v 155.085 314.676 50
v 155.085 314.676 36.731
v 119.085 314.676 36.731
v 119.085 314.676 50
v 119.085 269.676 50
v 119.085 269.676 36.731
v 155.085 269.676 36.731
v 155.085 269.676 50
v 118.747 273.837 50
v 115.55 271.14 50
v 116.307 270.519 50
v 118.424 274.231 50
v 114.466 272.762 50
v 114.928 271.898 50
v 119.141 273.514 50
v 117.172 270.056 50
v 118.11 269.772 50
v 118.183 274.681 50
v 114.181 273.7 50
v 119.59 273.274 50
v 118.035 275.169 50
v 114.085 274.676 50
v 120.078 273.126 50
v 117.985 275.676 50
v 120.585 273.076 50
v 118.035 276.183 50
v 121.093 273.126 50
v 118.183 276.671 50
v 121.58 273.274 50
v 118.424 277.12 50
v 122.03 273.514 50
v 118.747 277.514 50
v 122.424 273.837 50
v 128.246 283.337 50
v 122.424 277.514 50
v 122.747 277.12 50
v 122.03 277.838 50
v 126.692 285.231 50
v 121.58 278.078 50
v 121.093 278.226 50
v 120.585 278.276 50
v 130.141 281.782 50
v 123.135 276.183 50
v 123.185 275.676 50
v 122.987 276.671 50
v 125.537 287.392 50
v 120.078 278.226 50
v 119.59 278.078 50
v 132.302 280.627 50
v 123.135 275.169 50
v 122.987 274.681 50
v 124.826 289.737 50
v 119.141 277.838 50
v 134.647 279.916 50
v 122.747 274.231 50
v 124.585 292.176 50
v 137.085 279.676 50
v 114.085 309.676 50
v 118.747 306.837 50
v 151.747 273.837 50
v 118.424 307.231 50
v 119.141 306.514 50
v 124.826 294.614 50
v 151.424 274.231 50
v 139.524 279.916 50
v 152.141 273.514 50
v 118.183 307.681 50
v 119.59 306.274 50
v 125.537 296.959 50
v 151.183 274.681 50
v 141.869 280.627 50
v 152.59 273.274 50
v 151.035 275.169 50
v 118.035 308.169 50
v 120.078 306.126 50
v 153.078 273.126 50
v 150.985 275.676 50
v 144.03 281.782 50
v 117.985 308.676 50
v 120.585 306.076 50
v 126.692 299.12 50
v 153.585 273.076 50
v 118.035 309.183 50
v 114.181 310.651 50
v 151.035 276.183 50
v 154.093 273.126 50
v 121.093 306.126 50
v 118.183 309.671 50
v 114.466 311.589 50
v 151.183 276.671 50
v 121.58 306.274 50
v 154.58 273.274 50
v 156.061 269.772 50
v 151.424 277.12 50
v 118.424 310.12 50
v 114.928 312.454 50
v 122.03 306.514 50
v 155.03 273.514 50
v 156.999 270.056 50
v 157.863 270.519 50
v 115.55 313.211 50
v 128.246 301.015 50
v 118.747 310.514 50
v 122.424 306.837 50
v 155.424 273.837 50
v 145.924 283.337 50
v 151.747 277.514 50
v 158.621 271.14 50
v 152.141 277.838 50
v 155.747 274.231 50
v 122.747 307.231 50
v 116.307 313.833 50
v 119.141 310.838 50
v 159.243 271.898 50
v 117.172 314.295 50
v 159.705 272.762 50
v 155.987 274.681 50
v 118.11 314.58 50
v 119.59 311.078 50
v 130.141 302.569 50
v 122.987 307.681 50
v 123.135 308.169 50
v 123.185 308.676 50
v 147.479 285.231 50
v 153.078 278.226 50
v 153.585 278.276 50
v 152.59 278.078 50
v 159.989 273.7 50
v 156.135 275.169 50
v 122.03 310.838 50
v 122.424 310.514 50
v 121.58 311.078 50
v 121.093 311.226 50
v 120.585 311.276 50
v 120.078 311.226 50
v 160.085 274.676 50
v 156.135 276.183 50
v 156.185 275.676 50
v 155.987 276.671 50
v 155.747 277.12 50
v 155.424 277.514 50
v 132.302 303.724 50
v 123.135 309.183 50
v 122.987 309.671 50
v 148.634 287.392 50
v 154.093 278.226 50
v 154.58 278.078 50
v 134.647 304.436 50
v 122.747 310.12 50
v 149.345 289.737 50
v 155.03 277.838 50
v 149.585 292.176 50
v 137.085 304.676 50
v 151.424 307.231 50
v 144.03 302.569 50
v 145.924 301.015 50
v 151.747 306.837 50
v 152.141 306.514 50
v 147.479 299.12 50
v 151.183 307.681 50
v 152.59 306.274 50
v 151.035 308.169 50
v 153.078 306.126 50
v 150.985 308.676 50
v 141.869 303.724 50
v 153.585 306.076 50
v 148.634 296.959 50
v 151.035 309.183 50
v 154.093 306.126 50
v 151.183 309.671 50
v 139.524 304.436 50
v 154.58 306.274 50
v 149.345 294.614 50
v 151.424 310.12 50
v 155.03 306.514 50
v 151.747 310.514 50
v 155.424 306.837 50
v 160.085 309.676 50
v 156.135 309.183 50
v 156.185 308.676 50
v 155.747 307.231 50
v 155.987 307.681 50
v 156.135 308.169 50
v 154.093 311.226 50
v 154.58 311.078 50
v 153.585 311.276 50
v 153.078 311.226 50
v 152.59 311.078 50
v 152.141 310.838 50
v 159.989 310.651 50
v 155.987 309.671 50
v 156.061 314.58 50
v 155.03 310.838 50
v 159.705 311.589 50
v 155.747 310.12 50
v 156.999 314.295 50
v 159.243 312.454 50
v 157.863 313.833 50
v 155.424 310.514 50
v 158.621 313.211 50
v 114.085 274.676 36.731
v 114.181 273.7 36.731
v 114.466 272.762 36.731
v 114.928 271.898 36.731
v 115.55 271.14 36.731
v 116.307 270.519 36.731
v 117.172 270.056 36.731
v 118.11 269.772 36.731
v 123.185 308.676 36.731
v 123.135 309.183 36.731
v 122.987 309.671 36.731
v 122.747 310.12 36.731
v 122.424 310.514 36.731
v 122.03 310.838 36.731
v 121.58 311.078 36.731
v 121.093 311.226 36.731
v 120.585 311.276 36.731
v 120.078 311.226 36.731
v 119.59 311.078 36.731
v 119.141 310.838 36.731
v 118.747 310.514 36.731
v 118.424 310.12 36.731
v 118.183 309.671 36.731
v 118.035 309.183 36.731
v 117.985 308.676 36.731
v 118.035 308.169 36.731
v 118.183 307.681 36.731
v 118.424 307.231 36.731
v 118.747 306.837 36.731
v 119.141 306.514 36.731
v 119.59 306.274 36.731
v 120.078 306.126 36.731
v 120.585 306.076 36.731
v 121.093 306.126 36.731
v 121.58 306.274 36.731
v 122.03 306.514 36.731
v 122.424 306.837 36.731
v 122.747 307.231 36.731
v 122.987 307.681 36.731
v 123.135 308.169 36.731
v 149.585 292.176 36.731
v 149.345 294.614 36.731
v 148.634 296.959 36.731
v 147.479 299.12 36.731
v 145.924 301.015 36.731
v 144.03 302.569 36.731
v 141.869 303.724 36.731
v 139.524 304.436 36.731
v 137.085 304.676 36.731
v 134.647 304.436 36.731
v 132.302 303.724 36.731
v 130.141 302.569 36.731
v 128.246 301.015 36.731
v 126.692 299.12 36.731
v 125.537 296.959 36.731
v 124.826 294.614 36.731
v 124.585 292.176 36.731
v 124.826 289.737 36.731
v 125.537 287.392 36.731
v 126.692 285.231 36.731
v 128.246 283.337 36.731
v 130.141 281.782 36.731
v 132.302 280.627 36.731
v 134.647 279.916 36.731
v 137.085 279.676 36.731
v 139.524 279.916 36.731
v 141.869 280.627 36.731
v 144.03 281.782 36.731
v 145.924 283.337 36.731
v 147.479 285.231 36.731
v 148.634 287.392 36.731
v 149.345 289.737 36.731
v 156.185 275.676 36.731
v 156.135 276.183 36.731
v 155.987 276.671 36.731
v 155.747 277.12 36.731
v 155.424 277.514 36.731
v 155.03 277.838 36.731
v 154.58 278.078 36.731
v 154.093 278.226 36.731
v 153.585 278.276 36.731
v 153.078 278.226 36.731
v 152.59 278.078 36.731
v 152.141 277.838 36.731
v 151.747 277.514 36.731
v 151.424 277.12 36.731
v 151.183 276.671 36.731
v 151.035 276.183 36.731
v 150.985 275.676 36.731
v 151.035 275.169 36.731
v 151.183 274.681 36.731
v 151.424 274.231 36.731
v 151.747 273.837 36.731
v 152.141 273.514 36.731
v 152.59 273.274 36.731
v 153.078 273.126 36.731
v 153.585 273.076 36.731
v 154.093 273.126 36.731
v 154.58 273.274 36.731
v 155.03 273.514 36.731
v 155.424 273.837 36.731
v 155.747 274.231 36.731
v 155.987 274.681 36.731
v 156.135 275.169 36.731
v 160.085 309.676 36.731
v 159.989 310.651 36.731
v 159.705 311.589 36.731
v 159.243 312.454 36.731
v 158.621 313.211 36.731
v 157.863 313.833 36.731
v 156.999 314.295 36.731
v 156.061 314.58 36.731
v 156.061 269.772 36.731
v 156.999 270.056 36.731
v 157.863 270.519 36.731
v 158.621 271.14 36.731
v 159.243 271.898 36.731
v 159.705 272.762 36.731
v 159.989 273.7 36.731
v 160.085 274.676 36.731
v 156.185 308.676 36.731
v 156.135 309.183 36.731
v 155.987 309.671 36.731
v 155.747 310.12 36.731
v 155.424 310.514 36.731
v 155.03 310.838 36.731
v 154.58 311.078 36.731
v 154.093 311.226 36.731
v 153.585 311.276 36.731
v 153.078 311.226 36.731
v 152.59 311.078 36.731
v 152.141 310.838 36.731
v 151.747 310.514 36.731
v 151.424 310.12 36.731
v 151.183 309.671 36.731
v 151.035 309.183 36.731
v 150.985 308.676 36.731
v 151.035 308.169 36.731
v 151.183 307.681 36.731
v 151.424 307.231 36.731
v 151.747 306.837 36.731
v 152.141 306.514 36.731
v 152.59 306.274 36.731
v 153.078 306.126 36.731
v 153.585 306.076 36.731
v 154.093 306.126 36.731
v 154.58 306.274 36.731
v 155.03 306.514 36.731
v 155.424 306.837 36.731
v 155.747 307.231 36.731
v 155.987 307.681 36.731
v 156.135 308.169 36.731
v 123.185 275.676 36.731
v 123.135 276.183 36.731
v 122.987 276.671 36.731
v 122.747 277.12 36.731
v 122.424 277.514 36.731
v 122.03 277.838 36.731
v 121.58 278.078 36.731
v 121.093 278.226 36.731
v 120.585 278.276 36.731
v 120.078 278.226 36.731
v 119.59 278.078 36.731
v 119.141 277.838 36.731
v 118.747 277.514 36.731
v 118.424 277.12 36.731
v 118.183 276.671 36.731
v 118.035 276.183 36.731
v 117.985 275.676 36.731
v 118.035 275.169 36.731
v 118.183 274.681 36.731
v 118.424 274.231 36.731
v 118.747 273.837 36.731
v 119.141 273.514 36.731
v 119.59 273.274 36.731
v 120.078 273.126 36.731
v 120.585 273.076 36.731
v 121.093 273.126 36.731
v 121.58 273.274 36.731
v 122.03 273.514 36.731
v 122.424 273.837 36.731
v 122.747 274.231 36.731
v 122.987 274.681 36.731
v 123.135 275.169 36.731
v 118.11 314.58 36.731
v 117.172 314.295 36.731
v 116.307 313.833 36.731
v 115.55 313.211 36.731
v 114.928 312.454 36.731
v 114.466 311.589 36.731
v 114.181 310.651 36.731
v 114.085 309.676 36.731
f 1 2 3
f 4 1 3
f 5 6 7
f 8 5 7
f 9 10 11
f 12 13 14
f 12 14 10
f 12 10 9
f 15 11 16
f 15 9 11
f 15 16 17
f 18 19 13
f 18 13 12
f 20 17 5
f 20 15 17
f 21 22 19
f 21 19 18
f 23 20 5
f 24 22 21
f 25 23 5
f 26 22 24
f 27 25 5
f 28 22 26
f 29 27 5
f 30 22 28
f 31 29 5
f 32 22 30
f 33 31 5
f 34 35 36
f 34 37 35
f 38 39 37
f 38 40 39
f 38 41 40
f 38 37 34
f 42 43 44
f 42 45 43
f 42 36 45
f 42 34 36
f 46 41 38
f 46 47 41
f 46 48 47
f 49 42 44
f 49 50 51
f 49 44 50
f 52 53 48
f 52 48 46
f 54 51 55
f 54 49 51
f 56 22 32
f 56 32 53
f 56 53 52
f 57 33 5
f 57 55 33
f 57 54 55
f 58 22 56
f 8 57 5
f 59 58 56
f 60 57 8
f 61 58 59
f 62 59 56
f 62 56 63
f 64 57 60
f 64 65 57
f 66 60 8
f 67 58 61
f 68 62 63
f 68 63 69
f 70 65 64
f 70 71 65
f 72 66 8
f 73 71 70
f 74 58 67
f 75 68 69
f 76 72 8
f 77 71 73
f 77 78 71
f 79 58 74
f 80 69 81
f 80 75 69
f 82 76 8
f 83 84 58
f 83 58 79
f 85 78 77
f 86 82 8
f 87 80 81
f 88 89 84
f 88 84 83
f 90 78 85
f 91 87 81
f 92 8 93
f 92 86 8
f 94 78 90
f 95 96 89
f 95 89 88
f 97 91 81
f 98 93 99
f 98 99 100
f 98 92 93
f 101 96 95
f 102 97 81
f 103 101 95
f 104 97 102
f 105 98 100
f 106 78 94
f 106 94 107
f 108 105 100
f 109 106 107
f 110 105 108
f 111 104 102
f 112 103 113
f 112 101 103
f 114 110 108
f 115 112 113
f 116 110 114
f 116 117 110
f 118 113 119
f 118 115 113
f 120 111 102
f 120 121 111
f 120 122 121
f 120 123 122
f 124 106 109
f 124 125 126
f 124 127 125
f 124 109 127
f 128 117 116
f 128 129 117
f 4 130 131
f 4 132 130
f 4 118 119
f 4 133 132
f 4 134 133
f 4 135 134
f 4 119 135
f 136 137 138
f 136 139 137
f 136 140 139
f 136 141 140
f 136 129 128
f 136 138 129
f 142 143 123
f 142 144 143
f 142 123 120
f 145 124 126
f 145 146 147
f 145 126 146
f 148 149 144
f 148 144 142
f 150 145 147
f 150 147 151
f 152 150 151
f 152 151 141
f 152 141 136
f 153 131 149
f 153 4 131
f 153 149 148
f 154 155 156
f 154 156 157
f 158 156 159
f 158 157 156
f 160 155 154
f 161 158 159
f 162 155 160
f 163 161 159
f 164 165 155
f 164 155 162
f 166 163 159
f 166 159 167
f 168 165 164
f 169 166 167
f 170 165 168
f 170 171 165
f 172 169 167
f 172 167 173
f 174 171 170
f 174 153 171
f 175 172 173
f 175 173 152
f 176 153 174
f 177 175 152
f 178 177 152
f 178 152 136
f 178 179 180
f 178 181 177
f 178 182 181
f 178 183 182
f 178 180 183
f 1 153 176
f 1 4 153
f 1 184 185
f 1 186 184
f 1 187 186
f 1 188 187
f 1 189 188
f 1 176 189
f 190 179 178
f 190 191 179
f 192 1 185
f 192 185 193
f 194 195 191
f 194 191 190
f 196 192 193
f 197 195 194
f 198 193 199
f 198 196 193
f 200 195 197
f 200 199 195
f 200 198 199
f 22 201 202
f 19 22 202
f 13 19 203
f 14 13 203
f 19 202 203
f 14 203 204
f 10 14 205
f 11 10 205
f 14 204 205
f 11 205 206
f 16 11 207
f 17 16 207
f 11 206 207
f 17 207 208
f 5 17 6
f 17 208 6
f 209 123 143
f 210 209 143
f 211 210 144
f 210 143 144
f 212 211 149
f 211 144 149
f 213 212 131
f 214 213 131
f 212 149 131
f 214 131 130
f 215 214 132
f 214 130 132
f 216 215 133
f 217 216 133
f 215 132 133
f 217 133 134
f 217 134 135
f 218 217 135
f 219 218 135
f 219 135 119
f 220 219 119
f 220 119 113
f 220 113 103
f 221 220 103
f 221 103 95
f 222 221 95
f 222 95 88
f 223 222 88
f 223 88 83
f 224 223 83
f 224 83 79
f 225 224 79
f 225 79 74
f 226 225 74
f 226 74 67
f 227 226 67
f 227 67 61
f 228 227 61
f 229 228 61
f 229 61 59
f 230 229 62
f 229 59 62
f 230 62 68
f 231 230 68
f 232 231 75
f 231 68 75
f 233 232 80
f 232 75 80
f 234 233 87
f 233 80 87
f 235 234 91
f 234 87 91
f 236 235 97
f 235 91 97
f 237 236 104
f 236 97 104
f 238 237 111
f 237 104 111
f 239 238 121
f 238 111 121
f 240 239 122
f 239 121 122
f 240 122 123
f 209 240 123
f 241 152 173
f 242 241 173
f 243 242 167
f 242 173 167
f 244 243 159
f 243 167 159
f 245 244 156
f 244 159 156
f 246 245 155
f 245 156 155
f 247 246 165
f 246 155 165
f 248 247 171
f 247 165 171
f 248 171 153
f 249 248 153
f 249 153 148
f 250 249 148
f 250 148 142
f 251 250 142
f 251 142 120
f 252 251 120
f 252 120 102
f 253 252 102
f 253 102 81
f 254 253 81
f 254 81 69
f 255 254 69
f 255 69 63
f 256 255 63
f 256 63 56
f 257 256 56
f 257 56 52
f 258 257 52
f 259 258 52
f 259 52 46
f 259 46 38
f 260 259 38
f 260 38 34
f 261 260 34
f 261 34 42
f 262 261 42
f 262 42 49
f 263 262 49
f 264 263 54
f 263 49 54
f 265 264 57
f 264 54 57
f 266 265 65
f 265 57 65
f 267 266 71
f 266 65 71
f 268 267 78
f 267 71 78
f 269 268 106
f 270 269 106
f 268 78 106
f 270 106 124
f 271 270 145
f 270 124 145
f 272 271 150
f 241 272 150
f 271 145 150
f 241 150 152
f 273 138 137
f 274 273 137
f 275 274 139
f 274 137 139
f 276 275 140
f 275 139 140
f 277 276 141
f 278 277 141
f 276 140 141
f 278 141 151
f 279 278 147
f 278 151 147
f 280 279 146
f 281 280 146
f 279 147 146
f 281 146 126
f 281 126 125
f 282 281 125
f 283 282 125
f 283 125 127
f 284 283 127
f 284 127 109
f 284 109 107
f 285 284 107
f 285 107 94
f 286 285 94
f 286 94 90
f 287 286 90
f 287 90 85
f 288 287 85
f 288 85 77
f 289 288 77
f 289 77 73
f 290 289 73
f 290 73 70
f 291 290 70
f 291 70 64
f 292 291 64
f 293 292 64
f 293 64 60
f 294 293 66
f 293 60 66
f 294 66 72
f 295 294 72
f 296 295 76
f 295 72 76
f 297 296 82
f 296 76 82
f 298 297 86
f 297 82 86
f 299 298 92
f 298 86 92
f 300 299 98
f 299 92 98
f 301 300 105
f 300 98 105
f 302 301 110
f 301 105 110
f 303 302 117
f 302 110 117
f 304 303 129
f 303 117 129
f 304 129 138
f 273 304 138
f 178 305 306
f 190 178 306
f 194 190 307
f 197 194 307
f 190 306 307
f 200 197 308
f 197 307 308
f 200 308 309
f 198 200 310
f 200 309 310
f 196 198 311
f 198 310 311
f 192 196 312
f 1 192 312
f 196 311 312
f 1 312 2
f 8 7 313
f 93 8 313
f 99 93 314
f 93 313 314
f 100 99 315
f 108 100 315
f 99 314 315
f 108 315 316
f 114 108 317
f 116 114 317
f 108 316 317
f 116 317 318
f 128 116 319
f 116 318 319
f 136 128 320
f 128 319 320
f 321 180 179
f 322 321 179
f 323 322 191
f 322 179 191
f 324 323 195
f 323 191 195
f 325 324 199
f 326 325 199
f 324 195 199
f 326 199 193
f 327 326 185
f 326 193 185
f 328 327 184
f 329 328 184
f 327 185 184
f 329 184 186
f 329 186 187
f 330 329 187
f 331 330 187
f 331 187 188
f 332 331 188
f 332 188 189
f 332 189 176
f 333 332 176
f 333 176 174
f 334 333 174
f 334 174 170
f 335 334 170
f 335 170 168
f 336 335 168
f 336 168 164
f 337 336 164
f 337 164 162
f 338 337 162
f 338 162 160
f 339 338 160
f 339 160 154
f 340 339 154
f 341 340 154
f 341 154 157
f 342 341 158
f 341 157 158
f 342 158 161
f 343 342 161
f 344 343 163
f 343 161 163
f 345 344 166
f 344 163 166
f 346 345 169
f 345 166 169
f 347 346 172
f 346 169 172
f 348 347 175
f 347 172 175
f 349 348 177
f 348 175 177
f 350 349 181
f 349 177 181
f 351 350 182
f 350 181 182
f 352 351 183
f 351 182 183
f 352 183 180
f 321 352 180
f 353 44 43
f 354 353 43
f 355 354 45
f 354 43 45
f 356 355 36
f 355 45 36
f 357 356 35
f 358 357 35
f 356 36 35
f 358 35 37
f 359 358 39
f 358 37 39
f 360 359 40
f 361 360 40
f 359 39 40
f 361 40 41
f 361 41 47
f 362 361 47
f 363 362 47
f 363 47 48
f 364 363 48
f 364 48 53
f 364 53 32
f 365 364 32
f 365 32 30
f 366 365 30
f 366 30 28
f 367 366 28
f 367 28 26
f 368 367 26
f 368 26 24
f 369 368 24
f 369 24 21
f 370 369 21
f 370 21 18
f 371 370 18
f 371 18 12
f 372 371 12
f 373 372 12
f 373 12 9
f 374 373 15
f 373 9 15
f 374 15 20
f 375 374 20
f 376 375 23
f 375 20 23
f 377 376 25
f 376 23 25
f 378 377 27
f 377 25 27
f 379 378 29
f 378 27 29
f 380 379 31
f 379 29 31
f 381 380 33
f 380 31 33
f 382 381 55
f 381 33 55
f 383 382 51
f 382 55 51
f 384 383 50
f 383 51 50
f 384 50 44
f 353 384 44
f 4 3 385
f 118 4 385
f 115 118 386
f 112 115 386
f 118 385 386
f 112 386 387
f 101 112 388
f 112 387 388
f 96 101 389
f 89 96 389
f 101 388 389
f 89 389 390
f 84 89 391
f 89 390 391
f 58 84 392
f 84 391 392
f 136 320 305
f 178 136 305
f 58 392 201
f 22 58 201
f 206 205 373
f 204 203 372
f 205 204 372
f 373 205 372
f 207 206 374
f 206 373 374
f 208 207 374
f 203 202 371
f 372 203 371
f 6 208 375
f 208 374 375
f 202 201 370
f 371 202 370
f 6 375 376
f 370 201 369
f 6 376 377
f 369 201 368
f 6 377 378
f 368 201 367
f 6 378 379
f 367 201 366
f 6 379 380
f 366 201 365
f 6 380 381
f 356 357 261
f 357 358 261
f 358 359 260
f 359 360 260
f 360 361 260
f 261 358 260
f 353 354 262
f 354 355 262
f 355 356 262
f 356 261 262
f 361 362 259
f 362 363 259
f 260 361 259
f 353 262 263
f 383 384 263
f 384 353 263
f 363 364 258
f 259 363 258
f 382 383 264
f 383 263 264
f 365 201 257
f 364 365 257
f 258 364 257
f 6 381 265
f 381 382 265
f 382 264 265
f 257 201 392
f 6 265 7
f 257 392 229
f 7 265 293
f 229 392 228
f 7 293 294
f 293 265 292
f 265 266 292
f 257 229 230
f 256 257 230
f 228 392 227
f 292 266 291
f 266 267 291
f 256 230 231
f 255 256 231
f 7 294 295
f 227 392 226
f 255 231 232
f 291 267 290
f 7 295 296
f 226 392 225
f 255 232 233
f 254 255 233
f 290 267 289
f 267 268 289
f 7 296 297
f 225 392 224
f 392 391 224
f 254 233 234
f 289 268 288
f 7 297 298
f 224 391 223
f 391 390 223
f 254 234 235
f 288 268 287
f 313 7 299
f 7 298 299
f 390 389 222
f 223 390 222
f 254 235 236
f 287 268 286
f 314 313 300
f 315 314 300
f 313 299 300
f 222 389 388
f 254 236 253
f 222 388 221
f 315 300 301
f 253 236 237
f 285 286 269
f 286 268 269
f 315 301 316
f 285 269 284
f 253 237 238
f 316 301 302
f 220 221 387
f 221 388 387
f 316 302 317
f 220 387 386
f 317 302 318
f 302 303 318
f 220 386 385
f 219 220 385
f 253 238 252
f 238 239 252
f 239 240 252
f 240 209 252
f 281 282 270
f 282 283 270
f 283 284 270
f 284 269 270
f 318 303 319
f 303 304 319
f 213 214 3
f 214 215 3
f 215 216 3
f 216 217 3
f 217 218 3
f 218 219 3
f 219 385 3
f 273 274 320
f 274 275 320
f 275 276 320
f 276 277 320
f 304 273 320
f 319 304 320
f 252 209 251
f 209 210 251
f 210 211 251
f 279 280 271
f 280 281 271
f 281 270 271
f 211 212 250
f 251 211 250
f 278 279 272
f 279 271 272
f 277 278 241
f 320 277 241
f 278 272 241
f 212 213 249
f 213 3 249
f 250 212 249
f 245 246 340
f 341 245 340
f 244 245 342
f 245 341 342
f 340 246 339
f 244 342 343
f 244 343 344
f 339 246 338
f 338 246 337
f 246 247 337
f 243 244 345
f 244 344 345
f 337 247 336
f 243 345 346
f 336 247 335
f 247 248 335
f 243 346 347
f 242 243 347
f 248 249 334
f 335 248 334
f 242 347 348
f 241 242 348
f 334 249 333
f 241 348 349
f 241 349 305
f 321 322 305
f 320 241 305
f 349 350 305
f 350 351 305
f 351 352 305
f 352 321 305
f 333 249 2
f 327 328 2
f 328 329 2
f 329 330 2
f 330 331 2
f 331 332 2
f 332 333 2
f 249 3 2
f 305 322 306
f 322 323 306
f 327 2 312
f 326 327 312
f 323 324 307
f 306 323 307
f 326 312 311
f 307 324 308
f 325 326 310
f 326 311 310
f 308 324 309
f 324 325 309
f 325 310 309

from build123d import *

# Parameters (mm, degrees)
EXTRUDE_1_DEPTH     = 13.268852707
SKETCH_2_R          = 2.6
CUT_EXTRUDE_1_DEPTH = 30
SKETCH_3_R          = 12.5
CUT_EXTRUDE_2_DEPTH = 30


with BuildPart() as part:
    # Эскиз1 → Бобышка-Вытянуть1 (new body)
    with BuildSketch(Plane.XY.offset(36.731147293)):
        with BuildLine():
            Line((114.085323537, 309.675869107), (114.085323537, 274.675869107))
            ThreePointArc((114.085323537, 274.675869107), (115.549789632, 271.140335201), (119.085323537, 269.675869107))
            Line((119.085323537, 269.675869107), (155.085323537, 269.675869107))
            ThreePointArc((155.085323537, 269.675869107), (158.620857443, 271.140335201), (160.085323537, 274.675869107))
            Line((160.085323537, 274.675869107), (160.085323537, 309.675869107))
            ThreePointArc((160.085323537, 309.675869107), (158.620857443, 313.211403013), (155.085323537, 314.675869107))
            Line((155.085323537, 314.675869107), (119.085323537, 314.675869107))
            ThreePointArc((119.085323537, 314.675869107), (115.549789632, 313.211403013), (114.085323537, 309.675869107))
        make_face()
    extrude(amount=EXTRUDE_1_DEPTH)

    # Эскиз2 → Вырез-Вытянуть1 (cut)
    with BuildSketch(Plane.XY.offset(50)):
        with Locations((153.585323537, 308.675869107)):
            Circle(SKETCH_2_R)
        with Locations((120.585323537, 308.675869107)):
            Circle(SKETCH_2_R)
        with Locations((120.585323537, 275.675869107)):
            Circle(SKETCH_2_R)
        with Locations((153.585323537, 275.675869107)):
            Circle(SKETCH_2_R)
    extrude(amount=-CUT_EXTRUDE_1_DEPTH, mode=Mode.SUBTRACT)

    # Эскиз3 → Вырез-Вытянуть2 (cut)
    with BuildSketch(Plane.XY.offset(50)):
        with Locations((137.085323537, 292.175869107)):
            Circle(SKETCH_3_R)
    extrude(amount=-CUT_EXTRUDE_2_DEPTH, mode=Mode.SUBTRACT)


solid = part.part
